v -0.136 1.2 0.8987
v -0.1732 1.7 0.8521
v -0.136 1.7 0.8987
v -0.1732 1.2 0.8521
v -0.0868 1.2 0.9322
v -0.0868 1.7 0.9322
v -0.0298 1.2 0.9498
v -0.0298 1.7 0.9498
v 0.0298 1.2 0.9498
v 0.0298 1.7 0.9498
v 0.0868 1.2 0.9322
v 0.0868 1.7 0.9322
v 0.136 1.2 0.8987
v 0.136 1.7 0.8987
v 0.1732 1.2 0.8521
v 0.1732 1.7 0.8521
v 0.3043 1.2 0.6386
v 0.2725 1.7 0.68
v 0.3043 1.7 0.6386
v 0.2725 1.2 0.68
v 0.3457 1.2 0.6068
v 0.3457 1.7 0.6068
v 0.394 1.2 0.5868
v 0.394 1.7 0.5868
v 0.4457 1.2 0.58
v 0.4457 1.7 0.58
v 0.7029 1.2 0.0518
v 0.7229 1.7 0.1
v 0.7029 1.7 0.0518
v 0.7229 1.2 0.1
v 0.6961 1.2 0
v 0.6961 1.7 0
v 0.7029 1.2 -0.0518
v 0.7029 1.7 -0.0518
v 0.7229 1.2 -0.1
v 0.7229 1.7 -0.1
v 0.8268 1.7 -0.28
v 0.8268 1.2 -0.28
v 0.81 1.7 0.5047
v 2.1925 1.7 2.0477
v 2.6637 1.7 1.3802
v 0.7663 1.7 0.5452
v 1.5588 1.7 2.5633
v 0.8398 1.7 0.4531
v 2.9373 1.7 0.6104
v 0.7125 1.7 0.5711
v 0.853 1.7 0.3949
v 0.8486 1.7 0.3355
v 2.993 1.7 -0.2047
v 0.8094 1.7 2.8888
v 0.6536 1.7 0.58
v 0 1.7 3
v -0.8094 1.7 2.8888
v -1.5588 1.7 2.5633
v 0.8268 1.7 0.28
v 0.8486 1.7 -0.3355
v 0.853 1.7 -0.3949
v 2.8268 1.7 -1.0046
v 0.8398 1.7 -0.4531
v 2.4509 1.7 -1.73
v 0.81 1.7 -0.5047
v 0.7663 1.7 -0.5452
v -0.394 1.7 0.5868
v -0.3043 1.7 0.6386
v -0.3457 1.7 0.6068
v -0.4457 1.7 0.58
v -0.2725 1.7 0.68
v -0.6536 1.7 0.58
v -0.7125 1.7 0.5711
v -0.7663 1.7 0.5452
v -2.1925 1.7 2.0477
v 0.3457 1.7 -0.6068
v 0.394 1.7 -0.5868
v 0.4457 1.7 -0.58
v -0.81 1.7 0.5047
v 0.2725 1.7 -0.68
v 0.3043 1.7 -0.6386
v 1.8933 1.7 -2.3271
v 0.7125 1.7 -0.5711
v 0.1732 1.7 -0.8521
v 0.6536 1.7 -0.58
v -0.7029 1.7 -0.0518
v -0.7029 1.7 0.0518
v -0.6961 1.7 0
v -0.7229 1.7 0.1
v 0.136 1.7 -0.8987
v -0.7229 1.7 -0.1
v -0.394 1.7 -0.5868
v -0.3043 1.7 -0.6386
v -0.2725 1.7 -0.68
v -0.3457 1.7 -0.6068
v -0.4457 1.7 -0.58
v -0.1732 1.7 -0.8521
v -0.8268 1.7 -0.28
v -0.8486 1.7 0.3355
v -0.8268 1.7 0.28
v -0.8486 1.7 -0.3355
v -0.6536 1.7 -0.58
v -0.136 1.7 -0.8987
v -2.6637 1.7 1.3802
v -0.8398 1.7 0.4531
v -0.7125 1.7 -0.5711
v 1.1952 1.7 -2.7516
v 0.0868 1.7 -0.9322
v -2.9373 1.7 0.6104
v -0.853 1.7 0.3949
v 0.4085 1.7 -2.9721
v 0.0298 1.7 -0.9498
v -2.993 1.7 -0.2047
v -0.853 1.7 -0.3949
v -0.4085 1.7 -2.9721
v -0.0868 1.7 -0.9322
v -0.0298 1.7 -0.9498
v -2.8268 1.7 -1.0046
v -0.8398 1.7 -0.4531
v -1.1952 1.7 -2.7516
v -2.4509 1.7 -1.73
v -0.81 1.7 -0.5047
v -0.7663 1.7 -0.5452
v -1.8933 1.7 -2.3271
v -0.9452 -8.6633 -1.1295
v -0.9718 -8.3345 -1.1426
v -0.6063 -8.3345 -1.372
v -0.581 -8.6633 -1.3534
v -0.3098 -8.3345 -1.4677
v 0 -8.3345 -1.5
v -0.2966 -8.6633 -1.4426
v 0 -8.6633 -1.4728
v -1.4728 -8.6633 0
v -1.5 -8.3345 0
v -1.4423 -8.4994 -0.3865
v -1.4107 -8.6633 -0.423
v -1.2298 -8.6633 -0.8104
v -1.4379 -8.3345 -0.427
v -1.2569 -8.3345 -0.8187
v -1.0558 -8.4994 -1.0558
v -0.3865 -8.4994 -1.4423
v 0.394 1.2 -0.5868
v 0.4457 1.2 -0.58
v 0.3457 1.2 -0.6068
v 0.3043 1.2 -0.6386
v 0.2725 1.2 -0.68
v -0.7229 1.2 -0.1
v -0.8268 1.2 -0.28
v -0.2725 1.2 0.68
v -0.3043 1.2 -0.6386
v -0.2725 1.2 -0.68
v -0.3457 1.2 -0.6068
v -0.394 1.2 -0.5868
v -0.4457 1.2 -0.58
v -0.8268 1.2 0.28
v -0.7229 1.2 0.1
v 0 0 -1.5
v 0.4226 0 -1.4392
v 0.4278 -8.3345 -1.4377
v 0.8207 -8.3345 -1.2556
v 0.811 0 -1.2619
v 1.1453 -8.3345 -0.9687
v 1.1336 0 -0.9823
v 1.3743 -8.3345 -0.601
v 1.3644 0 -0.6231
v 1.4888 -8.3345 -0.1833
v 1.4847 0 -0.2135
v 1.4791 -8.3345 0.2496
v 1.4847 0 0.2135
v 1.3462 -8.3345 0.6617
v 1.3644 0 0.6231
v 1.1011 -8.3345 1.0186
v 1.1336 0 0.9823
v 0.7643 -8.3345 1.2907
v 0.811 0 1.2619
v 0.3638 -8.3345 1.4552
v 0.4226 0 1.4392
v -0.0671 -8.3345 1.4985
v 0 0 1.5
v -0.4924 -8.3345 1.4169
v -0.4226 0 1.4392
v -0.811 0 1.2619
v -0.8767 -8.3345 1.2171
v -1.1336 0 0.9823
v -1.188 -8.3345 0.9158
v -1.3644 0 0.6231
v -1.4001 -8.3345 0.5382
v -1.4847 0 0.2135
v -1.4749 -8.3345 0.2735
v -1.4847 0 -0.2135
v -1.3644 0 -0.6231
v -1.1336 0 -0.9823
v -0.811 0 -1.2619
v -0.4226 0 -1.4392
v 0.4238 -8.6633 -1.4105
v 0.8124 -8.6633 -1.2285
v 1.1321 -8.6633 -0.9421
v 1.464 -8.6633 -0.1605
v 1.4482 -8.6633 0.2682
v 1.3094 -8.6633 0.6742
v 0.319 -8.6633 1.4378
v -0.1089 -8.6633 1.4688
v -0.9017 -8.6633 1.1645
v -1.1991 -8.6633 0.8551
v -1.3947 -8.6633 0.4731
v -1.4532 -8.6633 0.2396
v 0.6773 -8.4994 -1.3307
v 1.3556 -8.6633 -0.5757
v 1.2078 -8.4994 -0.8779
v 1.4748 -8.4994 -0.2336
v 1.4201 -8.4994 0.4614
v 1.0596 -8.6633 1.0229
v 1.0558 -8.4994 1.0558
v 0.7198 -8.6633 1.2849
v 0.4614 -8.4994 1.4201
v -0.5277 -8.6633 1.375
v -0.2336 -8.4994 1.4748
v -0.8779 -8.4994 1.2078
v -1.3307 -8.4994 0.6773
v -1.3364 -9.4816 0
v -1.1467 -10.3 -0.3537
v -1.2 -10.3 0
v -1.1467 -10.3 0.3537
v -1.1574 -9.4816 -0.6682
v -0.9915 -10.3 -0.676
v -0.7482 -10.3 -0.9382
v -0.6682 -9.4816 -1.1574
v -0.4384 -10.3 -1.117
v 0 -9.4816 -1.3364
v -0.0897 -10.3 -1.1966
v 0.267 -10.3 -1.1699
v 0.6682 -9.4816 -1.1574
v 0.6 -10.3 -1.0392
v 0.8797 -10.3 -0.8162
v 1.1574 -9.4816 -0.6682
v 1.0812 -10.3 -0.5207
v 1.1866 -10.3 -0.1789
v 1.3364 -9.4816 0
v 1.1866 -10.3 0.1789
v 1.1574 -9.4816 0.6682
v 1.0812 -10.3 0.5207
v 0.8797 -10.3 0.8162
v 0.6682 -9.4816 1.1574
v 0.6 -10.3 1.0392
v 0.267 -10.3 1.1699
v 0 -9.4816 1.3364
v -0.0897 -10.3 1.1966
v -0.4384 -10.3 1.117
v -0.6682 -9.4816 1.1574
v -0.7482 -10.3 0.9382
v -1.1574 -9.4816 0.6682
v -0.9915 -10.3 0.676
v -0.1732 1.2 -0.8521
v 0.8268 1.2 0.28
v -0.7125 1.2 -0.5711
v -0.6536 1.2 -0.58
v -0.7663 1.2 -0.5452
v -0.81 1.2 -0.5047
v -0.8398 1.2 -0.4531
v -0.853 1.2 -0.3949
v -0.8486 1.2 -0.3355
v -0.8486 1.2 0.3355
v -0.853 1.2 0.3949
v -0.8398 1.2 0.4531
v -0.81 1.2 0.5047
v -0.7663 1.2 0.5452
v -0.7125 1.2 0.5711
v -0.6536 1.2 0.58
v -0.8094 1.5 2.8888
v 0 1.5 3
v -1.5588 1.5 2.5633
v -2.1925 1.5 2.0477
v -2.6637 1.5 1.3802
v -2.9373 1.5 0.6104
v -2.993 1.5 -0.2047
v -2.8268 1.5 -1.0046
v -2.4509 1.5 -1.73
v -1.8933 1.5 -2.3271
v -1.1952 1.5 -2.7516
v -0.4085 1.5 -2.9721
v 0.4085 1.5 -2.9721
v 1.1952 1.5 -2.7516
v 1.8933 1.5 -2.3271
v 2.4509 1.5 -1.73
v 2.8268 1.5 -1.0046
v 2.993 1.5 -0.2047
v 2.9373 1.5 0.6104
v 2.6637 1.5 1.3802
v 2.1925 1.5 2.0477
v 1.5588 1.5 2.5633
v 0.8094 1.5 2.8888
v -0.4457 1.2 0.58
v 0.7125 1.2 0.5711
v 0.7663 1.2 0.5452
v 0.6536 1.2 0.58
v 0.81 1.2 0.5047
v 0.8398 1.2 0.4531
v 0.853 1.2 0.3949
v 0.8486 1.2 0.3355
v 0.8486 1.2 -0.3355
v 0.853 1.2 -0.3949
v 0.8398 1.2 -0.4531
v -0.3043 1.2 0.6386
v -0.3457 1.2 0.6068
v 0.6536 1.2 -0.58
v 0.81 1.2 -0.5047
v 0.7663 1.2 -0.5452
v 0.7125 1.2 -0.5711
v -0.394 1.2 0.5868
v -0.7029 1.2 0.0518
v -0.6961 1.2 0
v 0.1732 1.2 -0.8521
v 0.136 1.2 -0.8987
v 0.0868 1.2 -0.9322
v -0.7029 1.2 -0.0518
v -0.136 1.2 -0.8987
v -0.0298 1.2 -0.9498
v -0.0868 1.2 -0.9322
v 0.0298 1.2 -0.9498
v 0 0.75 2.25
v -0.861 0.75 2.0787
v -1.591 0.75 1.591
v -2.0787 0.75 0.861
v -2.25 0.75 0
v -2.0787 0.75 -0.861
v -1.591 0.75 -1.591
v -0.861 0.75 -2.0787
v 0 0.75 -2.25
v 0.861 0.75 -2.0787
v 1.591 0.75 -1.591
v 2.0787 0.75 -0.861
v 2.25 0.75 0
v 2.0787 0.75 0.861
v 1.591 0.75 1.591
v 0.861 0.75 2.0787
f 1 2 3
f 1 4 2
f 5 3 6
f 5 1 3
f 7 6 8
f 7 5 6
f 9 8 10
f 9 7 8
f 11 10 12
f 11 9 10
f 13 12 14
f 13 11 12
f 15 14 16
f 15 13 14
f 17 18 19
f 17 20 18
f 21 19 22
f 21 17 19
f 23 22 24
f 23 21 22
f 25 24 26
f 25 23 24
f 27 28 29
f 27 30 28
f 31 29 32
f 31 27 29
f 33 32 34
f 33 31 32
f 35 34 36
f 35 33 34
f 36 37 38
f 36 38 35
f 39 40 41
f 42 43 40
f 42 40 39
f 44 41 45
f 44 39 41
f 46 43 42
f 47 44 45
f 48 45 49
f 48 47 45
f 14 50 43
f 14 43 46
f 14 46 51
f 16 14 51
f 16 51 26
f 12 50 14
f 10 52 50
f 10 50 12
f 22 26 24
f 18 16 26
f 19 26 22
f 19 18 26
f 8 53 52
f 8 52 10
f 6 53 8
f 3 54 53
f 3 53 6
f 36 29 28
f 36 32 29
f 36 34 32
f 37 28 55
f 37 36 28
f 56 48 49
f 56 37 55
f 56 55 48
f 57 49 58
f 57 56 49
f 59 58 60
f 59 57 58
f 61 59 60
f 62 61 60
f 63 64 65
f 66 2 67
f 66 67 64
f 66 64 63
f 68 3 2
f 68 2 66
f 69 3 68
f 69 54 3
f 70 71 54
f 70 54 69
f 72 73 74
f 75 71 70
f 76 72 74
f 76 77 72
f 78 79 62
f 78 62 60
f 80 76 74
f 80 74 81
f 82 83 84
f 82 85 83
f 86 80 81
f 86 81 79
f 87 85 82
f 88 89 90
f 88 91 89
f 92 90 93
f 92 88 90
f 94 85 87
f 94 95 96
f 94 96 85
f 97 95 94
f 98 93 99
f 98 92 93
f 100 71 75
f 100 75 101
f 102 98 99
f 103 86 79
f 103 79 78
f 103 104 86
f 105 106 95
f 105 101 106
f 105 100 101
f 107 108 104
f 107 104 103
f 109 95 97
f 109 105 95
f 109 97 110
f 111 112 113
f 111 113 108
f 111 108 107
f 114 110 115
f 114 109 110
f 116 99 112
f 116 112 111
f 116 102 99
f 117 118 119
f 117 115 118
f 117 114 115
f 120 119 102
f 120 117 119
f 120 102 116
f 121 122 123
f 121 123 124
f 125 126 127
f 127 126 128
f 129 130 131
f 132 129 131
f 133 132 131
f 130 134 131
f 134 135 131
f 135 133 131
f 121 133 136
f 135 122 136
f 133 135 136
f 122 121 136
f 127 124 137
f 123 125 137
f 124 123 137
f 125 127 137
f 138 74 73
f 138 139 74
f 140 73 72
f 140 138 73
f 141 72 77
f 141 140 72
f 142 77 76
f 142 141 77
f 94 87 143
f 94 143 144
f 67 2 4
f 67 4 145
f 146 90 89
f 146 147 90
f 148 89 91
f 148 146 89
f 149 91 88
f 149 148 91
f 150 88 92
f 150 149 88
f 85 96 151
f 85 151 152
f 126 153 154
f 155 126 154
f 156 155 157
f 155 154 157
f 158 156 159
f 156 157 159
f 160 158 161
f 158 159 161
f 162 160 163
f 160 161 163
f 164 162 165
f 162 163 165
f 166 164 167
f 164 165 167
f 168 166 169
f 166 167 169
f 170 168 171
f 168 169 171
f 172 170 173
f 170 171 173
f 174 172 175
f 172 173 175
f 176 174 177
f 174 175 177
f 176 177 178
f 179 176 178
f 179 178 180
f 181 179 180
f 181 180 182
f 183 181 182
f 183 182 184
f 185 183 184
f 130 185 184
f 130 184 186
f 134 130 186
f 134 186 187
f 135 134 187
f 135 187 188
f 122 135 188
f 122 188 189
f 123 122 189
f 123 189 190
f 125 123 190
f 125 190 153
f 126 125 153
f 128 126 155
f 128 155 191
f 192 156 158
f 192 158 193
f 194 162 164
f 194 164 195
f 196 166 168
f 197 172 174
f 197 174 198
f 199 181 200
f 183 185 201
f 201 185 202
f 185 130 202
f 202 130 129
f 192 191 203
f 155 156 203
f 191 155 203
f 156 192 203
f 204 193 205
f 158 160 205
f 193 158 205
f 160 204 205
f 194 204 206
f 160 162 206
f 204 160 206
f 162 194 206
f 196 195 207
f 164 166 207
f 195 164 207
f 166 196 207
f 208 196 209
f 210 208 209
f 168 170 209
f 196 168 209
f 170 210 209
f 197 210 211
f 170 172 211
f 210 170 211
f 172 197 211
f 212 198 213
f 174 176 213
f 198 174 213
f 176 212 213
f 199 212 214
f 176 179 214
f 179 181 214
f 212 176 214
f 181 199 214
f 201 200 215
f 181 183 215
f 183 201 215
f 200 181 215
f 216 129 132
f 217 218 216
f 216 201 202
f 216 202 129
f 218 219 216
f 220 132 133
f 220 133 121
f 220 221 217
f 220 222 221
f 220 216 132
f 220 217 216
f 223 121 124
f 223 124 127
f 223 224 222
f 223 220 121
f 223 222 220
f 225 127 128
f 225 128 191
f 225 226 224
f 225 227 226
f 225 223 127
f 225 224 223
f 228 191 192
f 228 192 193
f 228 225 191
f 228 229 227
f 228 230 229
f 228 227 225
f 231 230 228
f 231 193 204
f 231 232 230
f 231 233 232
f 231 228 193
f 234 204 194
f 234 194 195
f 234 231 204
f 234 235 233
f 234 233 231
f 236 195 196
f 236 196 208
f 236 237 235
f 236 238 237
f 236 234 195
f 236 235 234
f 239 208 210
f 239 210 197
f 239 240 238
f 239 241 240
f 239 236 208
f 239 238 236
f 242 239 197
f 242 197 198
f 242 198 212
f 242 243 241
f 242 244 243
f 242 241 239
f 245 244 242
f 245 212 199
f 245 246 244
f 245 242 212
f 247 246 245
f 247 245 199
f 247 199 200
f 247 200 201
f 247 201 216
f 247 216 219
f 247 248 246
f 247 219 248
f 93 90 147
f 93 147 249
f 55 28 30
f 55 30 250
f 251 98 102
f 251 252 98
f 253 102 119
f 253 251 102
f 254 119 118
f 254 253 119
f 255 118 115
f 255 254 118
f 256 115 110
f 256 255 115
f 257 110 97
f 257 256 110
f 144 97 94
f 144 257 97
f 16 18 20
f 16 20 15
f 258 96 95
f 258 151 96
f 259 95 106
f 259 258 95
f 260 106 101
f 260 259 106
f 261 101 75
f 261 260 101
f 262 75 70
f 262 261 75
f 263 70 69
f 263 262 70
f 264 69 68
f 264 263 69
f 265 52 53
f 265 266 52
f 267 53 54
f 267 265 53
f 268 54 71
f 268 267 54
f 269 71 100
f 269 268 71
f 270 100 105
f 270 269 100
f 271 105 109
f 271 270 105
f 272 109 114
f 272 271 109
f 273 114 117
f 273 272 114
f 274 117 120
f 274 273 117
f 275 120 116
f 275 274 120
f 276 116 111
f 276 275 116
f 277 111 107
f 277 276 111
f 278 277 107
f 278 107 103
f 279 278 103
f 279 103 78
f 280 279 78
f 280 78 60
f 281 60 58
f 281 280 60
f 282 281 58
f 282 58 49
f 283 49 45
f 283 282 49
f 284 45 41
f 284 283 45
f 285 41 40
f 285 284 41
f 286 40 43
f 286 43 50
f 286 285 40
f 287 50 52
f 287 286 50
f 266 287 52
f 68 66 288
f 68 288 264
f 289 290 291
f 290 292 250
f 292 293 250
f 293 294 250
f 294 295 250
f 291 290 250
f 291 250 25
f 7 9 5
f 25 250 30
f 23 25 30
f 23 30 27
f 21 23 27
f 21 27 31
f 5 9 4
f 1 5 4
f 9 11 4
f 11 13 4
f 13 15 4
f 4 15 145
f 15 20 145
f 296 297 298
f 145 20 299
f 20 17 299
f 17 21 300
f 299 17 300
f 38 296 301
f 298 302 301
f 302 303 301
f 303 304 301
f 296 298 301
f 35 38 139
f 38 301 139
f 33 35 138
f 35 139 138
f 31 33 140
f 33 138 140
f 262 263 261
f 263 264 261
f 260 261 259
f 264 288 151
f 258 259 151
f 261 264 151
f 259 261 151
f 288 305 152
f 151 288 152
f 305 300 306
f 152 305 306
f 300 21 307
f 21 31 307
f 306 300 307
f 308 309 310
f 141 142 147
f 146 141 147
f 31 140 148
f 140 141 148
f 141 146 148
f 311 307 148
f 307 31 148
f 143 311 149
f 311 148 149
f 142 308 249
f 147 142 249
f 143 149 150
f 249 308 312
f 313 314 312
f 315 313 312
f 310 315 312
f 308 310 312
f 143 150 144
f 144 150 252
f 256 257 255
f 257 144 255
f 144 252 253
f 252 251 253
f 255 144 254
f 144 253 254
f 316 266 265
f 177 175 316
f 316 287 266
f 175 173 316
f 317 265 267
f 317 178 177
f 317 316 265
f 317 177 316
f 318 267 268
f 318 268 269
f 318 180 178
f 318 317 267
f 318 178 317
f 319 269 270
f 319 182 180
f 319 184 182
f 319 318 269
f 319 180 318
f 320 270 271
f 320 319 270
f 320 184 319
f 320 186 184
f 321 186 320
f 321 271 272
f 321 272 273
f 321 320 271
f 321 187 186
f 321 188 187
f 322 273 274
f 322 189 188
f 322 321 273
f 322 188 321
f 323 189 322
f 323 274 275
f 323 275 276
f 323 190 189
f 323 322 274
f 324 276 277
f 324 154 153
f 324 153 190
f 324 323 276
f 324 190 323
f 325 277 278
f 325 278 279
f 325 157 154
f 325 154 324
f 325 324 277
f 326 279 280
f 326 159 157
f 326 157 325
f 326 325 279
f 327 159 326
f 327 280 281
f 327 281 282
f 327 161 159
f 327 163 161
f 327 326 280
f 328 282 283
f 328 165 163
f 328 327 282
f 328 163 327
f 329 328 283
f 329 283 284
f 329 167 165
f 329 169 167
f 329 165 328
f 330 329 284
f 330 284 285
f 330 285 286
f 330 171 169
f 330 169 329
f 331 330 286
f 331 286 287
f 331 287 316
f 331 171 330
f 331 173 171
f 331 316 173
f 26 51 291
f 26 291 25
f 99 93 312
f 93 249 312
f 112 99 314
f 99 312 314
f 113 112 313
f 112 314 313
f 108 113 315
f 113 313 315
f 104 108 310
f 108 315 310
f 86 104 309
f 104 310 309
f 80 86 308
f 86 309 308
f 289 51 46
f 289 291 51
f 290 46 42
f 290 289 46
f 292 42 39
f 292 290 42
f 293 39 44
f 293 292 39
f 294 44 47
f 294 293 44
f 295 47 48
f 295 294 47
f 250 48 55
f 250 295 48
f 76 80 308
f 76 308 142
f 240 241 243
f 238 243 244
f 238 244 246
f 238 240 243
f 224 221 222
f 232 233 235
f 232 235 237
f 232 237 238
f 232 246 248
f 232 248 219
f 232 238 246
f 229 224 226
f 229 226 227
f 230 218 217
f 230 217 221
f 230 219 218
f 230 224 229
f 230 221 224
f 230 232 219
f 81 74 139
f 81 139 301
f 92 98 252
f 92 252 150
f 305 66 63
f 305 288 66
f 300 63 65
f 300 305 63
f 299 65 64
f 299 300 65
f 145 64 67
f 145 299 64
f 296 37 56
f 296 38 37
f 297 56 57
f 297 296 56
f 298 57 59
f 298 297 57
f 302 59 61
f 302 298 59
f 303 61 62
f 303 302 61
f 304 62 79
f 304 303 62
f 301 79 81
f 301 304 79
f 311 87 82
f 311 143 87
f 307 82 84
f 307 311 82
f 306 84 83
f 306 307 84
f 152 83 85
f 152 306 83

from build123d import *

# Parameters (mm, degrees)
SKETCH2_R           = 1.5
BOSS_EXTRUDE1_DEPTH = 10.3
CUT_EXTRUDE1_DEPTH  = 0.5
FILLET1_R           = 0.2
FILLET3_R           = 2


with BuildPart() as part:
    # Sketch1 → Revolve1 (revolve)
    with BuildSketch(Plane.XY, mode=Mode.PRIVATE) as revolve1_sk:
        Polygon((0, 0), (0, 1.7), (3, 1.7), (3, 1.5), (1.5, 0), align=None)
    revolve(revolve1_sk.sketch.rotate(Axis((0, 50, 0), (0, -1, 0)), 90), axis=Axis((0, 50, 0), (0, -1, 0)))

    # Sketch2 → Boss-Extrude1 (add)
    with BuildSketch(Plane.XZ):
        with Locations(Location((0, 0, 0), (0, 0, 270))):
            Circle(SKETCH2_R)
    extrude(amount=BOSS_EXTRUDE1_DEPTH)

    # Sketch3 → Cut-Revolve1 (revolve, cut)
    with BuildSketch(Plane.XY, mode=Mode.PRIVATE) as cut_revolve1_sk:
        Polygon((1.5, -8.5), (1.2, -10.3), (1.5, -10.3), align=None)
    revolve(cut_revolve1_sk.sketch.rotate(Axis((0, 0, 0), (0, -1, 0)), 180), axis=Axis((0, 0, 0), (0, -1, 0)), mode=Mode.SUBTRACT)

    # Sketch4 → Cut-Extrude1 (cut)
    with BuildSketch(Plane(origin=(0, 1.7, 0), x_dir=(1, 0, 0), z_dir=(0, 1, 0))):
        Polygon((0, 1.152050808), (0.330273688, 0.58), (1, 0.58), (0.665136844, 0), (1, -0.58), (0.330273688, -0.58), (0, -1.152050808), (-0.330273688, -0.58), (-1, -0.58), (-0.665136844, 0), (-1, 0.58), (-0.330273688, 0.58), align=None)
    extrude(amount=-CUT_EXTRUDE1_DEPTH, mode=Mode.SUBTRACT)

    # Fillet1
    fillet1_edges = [part.edges().sort_by_distance(p)[0] for p in [
        (-0.330273688, 1.45, -0.58),
        (0, 1.45, -1.152050808),
        (0.330273688, 1.45, -0.58),
        (1, 1.45, -0.58),
        (0.665136844, 1.45, 0),
        (1, 1.45, 0.58),
        (0.330273688, 1.45, 0.58),
        (0, 1.45, 1.152050808),
        (-0.330273688, 1.45, 0.58),
        (-1, 1.45, 0.58),
        (-0.665136844, 1.45, 0),
        (-1, 1.45, -0.58),
    ]]
    fillet(fillet1_edges, radius=FILLET1_R)

    # Fillet3
    fillet3_edges = [part.edges().sort_by_distance(p)[0] for p in [
        (-1.060660172, -8.5, -1.060660172),
    ]]
    fillet(fillet3_edges, radius=FILLET3_R)


solid = part.part
